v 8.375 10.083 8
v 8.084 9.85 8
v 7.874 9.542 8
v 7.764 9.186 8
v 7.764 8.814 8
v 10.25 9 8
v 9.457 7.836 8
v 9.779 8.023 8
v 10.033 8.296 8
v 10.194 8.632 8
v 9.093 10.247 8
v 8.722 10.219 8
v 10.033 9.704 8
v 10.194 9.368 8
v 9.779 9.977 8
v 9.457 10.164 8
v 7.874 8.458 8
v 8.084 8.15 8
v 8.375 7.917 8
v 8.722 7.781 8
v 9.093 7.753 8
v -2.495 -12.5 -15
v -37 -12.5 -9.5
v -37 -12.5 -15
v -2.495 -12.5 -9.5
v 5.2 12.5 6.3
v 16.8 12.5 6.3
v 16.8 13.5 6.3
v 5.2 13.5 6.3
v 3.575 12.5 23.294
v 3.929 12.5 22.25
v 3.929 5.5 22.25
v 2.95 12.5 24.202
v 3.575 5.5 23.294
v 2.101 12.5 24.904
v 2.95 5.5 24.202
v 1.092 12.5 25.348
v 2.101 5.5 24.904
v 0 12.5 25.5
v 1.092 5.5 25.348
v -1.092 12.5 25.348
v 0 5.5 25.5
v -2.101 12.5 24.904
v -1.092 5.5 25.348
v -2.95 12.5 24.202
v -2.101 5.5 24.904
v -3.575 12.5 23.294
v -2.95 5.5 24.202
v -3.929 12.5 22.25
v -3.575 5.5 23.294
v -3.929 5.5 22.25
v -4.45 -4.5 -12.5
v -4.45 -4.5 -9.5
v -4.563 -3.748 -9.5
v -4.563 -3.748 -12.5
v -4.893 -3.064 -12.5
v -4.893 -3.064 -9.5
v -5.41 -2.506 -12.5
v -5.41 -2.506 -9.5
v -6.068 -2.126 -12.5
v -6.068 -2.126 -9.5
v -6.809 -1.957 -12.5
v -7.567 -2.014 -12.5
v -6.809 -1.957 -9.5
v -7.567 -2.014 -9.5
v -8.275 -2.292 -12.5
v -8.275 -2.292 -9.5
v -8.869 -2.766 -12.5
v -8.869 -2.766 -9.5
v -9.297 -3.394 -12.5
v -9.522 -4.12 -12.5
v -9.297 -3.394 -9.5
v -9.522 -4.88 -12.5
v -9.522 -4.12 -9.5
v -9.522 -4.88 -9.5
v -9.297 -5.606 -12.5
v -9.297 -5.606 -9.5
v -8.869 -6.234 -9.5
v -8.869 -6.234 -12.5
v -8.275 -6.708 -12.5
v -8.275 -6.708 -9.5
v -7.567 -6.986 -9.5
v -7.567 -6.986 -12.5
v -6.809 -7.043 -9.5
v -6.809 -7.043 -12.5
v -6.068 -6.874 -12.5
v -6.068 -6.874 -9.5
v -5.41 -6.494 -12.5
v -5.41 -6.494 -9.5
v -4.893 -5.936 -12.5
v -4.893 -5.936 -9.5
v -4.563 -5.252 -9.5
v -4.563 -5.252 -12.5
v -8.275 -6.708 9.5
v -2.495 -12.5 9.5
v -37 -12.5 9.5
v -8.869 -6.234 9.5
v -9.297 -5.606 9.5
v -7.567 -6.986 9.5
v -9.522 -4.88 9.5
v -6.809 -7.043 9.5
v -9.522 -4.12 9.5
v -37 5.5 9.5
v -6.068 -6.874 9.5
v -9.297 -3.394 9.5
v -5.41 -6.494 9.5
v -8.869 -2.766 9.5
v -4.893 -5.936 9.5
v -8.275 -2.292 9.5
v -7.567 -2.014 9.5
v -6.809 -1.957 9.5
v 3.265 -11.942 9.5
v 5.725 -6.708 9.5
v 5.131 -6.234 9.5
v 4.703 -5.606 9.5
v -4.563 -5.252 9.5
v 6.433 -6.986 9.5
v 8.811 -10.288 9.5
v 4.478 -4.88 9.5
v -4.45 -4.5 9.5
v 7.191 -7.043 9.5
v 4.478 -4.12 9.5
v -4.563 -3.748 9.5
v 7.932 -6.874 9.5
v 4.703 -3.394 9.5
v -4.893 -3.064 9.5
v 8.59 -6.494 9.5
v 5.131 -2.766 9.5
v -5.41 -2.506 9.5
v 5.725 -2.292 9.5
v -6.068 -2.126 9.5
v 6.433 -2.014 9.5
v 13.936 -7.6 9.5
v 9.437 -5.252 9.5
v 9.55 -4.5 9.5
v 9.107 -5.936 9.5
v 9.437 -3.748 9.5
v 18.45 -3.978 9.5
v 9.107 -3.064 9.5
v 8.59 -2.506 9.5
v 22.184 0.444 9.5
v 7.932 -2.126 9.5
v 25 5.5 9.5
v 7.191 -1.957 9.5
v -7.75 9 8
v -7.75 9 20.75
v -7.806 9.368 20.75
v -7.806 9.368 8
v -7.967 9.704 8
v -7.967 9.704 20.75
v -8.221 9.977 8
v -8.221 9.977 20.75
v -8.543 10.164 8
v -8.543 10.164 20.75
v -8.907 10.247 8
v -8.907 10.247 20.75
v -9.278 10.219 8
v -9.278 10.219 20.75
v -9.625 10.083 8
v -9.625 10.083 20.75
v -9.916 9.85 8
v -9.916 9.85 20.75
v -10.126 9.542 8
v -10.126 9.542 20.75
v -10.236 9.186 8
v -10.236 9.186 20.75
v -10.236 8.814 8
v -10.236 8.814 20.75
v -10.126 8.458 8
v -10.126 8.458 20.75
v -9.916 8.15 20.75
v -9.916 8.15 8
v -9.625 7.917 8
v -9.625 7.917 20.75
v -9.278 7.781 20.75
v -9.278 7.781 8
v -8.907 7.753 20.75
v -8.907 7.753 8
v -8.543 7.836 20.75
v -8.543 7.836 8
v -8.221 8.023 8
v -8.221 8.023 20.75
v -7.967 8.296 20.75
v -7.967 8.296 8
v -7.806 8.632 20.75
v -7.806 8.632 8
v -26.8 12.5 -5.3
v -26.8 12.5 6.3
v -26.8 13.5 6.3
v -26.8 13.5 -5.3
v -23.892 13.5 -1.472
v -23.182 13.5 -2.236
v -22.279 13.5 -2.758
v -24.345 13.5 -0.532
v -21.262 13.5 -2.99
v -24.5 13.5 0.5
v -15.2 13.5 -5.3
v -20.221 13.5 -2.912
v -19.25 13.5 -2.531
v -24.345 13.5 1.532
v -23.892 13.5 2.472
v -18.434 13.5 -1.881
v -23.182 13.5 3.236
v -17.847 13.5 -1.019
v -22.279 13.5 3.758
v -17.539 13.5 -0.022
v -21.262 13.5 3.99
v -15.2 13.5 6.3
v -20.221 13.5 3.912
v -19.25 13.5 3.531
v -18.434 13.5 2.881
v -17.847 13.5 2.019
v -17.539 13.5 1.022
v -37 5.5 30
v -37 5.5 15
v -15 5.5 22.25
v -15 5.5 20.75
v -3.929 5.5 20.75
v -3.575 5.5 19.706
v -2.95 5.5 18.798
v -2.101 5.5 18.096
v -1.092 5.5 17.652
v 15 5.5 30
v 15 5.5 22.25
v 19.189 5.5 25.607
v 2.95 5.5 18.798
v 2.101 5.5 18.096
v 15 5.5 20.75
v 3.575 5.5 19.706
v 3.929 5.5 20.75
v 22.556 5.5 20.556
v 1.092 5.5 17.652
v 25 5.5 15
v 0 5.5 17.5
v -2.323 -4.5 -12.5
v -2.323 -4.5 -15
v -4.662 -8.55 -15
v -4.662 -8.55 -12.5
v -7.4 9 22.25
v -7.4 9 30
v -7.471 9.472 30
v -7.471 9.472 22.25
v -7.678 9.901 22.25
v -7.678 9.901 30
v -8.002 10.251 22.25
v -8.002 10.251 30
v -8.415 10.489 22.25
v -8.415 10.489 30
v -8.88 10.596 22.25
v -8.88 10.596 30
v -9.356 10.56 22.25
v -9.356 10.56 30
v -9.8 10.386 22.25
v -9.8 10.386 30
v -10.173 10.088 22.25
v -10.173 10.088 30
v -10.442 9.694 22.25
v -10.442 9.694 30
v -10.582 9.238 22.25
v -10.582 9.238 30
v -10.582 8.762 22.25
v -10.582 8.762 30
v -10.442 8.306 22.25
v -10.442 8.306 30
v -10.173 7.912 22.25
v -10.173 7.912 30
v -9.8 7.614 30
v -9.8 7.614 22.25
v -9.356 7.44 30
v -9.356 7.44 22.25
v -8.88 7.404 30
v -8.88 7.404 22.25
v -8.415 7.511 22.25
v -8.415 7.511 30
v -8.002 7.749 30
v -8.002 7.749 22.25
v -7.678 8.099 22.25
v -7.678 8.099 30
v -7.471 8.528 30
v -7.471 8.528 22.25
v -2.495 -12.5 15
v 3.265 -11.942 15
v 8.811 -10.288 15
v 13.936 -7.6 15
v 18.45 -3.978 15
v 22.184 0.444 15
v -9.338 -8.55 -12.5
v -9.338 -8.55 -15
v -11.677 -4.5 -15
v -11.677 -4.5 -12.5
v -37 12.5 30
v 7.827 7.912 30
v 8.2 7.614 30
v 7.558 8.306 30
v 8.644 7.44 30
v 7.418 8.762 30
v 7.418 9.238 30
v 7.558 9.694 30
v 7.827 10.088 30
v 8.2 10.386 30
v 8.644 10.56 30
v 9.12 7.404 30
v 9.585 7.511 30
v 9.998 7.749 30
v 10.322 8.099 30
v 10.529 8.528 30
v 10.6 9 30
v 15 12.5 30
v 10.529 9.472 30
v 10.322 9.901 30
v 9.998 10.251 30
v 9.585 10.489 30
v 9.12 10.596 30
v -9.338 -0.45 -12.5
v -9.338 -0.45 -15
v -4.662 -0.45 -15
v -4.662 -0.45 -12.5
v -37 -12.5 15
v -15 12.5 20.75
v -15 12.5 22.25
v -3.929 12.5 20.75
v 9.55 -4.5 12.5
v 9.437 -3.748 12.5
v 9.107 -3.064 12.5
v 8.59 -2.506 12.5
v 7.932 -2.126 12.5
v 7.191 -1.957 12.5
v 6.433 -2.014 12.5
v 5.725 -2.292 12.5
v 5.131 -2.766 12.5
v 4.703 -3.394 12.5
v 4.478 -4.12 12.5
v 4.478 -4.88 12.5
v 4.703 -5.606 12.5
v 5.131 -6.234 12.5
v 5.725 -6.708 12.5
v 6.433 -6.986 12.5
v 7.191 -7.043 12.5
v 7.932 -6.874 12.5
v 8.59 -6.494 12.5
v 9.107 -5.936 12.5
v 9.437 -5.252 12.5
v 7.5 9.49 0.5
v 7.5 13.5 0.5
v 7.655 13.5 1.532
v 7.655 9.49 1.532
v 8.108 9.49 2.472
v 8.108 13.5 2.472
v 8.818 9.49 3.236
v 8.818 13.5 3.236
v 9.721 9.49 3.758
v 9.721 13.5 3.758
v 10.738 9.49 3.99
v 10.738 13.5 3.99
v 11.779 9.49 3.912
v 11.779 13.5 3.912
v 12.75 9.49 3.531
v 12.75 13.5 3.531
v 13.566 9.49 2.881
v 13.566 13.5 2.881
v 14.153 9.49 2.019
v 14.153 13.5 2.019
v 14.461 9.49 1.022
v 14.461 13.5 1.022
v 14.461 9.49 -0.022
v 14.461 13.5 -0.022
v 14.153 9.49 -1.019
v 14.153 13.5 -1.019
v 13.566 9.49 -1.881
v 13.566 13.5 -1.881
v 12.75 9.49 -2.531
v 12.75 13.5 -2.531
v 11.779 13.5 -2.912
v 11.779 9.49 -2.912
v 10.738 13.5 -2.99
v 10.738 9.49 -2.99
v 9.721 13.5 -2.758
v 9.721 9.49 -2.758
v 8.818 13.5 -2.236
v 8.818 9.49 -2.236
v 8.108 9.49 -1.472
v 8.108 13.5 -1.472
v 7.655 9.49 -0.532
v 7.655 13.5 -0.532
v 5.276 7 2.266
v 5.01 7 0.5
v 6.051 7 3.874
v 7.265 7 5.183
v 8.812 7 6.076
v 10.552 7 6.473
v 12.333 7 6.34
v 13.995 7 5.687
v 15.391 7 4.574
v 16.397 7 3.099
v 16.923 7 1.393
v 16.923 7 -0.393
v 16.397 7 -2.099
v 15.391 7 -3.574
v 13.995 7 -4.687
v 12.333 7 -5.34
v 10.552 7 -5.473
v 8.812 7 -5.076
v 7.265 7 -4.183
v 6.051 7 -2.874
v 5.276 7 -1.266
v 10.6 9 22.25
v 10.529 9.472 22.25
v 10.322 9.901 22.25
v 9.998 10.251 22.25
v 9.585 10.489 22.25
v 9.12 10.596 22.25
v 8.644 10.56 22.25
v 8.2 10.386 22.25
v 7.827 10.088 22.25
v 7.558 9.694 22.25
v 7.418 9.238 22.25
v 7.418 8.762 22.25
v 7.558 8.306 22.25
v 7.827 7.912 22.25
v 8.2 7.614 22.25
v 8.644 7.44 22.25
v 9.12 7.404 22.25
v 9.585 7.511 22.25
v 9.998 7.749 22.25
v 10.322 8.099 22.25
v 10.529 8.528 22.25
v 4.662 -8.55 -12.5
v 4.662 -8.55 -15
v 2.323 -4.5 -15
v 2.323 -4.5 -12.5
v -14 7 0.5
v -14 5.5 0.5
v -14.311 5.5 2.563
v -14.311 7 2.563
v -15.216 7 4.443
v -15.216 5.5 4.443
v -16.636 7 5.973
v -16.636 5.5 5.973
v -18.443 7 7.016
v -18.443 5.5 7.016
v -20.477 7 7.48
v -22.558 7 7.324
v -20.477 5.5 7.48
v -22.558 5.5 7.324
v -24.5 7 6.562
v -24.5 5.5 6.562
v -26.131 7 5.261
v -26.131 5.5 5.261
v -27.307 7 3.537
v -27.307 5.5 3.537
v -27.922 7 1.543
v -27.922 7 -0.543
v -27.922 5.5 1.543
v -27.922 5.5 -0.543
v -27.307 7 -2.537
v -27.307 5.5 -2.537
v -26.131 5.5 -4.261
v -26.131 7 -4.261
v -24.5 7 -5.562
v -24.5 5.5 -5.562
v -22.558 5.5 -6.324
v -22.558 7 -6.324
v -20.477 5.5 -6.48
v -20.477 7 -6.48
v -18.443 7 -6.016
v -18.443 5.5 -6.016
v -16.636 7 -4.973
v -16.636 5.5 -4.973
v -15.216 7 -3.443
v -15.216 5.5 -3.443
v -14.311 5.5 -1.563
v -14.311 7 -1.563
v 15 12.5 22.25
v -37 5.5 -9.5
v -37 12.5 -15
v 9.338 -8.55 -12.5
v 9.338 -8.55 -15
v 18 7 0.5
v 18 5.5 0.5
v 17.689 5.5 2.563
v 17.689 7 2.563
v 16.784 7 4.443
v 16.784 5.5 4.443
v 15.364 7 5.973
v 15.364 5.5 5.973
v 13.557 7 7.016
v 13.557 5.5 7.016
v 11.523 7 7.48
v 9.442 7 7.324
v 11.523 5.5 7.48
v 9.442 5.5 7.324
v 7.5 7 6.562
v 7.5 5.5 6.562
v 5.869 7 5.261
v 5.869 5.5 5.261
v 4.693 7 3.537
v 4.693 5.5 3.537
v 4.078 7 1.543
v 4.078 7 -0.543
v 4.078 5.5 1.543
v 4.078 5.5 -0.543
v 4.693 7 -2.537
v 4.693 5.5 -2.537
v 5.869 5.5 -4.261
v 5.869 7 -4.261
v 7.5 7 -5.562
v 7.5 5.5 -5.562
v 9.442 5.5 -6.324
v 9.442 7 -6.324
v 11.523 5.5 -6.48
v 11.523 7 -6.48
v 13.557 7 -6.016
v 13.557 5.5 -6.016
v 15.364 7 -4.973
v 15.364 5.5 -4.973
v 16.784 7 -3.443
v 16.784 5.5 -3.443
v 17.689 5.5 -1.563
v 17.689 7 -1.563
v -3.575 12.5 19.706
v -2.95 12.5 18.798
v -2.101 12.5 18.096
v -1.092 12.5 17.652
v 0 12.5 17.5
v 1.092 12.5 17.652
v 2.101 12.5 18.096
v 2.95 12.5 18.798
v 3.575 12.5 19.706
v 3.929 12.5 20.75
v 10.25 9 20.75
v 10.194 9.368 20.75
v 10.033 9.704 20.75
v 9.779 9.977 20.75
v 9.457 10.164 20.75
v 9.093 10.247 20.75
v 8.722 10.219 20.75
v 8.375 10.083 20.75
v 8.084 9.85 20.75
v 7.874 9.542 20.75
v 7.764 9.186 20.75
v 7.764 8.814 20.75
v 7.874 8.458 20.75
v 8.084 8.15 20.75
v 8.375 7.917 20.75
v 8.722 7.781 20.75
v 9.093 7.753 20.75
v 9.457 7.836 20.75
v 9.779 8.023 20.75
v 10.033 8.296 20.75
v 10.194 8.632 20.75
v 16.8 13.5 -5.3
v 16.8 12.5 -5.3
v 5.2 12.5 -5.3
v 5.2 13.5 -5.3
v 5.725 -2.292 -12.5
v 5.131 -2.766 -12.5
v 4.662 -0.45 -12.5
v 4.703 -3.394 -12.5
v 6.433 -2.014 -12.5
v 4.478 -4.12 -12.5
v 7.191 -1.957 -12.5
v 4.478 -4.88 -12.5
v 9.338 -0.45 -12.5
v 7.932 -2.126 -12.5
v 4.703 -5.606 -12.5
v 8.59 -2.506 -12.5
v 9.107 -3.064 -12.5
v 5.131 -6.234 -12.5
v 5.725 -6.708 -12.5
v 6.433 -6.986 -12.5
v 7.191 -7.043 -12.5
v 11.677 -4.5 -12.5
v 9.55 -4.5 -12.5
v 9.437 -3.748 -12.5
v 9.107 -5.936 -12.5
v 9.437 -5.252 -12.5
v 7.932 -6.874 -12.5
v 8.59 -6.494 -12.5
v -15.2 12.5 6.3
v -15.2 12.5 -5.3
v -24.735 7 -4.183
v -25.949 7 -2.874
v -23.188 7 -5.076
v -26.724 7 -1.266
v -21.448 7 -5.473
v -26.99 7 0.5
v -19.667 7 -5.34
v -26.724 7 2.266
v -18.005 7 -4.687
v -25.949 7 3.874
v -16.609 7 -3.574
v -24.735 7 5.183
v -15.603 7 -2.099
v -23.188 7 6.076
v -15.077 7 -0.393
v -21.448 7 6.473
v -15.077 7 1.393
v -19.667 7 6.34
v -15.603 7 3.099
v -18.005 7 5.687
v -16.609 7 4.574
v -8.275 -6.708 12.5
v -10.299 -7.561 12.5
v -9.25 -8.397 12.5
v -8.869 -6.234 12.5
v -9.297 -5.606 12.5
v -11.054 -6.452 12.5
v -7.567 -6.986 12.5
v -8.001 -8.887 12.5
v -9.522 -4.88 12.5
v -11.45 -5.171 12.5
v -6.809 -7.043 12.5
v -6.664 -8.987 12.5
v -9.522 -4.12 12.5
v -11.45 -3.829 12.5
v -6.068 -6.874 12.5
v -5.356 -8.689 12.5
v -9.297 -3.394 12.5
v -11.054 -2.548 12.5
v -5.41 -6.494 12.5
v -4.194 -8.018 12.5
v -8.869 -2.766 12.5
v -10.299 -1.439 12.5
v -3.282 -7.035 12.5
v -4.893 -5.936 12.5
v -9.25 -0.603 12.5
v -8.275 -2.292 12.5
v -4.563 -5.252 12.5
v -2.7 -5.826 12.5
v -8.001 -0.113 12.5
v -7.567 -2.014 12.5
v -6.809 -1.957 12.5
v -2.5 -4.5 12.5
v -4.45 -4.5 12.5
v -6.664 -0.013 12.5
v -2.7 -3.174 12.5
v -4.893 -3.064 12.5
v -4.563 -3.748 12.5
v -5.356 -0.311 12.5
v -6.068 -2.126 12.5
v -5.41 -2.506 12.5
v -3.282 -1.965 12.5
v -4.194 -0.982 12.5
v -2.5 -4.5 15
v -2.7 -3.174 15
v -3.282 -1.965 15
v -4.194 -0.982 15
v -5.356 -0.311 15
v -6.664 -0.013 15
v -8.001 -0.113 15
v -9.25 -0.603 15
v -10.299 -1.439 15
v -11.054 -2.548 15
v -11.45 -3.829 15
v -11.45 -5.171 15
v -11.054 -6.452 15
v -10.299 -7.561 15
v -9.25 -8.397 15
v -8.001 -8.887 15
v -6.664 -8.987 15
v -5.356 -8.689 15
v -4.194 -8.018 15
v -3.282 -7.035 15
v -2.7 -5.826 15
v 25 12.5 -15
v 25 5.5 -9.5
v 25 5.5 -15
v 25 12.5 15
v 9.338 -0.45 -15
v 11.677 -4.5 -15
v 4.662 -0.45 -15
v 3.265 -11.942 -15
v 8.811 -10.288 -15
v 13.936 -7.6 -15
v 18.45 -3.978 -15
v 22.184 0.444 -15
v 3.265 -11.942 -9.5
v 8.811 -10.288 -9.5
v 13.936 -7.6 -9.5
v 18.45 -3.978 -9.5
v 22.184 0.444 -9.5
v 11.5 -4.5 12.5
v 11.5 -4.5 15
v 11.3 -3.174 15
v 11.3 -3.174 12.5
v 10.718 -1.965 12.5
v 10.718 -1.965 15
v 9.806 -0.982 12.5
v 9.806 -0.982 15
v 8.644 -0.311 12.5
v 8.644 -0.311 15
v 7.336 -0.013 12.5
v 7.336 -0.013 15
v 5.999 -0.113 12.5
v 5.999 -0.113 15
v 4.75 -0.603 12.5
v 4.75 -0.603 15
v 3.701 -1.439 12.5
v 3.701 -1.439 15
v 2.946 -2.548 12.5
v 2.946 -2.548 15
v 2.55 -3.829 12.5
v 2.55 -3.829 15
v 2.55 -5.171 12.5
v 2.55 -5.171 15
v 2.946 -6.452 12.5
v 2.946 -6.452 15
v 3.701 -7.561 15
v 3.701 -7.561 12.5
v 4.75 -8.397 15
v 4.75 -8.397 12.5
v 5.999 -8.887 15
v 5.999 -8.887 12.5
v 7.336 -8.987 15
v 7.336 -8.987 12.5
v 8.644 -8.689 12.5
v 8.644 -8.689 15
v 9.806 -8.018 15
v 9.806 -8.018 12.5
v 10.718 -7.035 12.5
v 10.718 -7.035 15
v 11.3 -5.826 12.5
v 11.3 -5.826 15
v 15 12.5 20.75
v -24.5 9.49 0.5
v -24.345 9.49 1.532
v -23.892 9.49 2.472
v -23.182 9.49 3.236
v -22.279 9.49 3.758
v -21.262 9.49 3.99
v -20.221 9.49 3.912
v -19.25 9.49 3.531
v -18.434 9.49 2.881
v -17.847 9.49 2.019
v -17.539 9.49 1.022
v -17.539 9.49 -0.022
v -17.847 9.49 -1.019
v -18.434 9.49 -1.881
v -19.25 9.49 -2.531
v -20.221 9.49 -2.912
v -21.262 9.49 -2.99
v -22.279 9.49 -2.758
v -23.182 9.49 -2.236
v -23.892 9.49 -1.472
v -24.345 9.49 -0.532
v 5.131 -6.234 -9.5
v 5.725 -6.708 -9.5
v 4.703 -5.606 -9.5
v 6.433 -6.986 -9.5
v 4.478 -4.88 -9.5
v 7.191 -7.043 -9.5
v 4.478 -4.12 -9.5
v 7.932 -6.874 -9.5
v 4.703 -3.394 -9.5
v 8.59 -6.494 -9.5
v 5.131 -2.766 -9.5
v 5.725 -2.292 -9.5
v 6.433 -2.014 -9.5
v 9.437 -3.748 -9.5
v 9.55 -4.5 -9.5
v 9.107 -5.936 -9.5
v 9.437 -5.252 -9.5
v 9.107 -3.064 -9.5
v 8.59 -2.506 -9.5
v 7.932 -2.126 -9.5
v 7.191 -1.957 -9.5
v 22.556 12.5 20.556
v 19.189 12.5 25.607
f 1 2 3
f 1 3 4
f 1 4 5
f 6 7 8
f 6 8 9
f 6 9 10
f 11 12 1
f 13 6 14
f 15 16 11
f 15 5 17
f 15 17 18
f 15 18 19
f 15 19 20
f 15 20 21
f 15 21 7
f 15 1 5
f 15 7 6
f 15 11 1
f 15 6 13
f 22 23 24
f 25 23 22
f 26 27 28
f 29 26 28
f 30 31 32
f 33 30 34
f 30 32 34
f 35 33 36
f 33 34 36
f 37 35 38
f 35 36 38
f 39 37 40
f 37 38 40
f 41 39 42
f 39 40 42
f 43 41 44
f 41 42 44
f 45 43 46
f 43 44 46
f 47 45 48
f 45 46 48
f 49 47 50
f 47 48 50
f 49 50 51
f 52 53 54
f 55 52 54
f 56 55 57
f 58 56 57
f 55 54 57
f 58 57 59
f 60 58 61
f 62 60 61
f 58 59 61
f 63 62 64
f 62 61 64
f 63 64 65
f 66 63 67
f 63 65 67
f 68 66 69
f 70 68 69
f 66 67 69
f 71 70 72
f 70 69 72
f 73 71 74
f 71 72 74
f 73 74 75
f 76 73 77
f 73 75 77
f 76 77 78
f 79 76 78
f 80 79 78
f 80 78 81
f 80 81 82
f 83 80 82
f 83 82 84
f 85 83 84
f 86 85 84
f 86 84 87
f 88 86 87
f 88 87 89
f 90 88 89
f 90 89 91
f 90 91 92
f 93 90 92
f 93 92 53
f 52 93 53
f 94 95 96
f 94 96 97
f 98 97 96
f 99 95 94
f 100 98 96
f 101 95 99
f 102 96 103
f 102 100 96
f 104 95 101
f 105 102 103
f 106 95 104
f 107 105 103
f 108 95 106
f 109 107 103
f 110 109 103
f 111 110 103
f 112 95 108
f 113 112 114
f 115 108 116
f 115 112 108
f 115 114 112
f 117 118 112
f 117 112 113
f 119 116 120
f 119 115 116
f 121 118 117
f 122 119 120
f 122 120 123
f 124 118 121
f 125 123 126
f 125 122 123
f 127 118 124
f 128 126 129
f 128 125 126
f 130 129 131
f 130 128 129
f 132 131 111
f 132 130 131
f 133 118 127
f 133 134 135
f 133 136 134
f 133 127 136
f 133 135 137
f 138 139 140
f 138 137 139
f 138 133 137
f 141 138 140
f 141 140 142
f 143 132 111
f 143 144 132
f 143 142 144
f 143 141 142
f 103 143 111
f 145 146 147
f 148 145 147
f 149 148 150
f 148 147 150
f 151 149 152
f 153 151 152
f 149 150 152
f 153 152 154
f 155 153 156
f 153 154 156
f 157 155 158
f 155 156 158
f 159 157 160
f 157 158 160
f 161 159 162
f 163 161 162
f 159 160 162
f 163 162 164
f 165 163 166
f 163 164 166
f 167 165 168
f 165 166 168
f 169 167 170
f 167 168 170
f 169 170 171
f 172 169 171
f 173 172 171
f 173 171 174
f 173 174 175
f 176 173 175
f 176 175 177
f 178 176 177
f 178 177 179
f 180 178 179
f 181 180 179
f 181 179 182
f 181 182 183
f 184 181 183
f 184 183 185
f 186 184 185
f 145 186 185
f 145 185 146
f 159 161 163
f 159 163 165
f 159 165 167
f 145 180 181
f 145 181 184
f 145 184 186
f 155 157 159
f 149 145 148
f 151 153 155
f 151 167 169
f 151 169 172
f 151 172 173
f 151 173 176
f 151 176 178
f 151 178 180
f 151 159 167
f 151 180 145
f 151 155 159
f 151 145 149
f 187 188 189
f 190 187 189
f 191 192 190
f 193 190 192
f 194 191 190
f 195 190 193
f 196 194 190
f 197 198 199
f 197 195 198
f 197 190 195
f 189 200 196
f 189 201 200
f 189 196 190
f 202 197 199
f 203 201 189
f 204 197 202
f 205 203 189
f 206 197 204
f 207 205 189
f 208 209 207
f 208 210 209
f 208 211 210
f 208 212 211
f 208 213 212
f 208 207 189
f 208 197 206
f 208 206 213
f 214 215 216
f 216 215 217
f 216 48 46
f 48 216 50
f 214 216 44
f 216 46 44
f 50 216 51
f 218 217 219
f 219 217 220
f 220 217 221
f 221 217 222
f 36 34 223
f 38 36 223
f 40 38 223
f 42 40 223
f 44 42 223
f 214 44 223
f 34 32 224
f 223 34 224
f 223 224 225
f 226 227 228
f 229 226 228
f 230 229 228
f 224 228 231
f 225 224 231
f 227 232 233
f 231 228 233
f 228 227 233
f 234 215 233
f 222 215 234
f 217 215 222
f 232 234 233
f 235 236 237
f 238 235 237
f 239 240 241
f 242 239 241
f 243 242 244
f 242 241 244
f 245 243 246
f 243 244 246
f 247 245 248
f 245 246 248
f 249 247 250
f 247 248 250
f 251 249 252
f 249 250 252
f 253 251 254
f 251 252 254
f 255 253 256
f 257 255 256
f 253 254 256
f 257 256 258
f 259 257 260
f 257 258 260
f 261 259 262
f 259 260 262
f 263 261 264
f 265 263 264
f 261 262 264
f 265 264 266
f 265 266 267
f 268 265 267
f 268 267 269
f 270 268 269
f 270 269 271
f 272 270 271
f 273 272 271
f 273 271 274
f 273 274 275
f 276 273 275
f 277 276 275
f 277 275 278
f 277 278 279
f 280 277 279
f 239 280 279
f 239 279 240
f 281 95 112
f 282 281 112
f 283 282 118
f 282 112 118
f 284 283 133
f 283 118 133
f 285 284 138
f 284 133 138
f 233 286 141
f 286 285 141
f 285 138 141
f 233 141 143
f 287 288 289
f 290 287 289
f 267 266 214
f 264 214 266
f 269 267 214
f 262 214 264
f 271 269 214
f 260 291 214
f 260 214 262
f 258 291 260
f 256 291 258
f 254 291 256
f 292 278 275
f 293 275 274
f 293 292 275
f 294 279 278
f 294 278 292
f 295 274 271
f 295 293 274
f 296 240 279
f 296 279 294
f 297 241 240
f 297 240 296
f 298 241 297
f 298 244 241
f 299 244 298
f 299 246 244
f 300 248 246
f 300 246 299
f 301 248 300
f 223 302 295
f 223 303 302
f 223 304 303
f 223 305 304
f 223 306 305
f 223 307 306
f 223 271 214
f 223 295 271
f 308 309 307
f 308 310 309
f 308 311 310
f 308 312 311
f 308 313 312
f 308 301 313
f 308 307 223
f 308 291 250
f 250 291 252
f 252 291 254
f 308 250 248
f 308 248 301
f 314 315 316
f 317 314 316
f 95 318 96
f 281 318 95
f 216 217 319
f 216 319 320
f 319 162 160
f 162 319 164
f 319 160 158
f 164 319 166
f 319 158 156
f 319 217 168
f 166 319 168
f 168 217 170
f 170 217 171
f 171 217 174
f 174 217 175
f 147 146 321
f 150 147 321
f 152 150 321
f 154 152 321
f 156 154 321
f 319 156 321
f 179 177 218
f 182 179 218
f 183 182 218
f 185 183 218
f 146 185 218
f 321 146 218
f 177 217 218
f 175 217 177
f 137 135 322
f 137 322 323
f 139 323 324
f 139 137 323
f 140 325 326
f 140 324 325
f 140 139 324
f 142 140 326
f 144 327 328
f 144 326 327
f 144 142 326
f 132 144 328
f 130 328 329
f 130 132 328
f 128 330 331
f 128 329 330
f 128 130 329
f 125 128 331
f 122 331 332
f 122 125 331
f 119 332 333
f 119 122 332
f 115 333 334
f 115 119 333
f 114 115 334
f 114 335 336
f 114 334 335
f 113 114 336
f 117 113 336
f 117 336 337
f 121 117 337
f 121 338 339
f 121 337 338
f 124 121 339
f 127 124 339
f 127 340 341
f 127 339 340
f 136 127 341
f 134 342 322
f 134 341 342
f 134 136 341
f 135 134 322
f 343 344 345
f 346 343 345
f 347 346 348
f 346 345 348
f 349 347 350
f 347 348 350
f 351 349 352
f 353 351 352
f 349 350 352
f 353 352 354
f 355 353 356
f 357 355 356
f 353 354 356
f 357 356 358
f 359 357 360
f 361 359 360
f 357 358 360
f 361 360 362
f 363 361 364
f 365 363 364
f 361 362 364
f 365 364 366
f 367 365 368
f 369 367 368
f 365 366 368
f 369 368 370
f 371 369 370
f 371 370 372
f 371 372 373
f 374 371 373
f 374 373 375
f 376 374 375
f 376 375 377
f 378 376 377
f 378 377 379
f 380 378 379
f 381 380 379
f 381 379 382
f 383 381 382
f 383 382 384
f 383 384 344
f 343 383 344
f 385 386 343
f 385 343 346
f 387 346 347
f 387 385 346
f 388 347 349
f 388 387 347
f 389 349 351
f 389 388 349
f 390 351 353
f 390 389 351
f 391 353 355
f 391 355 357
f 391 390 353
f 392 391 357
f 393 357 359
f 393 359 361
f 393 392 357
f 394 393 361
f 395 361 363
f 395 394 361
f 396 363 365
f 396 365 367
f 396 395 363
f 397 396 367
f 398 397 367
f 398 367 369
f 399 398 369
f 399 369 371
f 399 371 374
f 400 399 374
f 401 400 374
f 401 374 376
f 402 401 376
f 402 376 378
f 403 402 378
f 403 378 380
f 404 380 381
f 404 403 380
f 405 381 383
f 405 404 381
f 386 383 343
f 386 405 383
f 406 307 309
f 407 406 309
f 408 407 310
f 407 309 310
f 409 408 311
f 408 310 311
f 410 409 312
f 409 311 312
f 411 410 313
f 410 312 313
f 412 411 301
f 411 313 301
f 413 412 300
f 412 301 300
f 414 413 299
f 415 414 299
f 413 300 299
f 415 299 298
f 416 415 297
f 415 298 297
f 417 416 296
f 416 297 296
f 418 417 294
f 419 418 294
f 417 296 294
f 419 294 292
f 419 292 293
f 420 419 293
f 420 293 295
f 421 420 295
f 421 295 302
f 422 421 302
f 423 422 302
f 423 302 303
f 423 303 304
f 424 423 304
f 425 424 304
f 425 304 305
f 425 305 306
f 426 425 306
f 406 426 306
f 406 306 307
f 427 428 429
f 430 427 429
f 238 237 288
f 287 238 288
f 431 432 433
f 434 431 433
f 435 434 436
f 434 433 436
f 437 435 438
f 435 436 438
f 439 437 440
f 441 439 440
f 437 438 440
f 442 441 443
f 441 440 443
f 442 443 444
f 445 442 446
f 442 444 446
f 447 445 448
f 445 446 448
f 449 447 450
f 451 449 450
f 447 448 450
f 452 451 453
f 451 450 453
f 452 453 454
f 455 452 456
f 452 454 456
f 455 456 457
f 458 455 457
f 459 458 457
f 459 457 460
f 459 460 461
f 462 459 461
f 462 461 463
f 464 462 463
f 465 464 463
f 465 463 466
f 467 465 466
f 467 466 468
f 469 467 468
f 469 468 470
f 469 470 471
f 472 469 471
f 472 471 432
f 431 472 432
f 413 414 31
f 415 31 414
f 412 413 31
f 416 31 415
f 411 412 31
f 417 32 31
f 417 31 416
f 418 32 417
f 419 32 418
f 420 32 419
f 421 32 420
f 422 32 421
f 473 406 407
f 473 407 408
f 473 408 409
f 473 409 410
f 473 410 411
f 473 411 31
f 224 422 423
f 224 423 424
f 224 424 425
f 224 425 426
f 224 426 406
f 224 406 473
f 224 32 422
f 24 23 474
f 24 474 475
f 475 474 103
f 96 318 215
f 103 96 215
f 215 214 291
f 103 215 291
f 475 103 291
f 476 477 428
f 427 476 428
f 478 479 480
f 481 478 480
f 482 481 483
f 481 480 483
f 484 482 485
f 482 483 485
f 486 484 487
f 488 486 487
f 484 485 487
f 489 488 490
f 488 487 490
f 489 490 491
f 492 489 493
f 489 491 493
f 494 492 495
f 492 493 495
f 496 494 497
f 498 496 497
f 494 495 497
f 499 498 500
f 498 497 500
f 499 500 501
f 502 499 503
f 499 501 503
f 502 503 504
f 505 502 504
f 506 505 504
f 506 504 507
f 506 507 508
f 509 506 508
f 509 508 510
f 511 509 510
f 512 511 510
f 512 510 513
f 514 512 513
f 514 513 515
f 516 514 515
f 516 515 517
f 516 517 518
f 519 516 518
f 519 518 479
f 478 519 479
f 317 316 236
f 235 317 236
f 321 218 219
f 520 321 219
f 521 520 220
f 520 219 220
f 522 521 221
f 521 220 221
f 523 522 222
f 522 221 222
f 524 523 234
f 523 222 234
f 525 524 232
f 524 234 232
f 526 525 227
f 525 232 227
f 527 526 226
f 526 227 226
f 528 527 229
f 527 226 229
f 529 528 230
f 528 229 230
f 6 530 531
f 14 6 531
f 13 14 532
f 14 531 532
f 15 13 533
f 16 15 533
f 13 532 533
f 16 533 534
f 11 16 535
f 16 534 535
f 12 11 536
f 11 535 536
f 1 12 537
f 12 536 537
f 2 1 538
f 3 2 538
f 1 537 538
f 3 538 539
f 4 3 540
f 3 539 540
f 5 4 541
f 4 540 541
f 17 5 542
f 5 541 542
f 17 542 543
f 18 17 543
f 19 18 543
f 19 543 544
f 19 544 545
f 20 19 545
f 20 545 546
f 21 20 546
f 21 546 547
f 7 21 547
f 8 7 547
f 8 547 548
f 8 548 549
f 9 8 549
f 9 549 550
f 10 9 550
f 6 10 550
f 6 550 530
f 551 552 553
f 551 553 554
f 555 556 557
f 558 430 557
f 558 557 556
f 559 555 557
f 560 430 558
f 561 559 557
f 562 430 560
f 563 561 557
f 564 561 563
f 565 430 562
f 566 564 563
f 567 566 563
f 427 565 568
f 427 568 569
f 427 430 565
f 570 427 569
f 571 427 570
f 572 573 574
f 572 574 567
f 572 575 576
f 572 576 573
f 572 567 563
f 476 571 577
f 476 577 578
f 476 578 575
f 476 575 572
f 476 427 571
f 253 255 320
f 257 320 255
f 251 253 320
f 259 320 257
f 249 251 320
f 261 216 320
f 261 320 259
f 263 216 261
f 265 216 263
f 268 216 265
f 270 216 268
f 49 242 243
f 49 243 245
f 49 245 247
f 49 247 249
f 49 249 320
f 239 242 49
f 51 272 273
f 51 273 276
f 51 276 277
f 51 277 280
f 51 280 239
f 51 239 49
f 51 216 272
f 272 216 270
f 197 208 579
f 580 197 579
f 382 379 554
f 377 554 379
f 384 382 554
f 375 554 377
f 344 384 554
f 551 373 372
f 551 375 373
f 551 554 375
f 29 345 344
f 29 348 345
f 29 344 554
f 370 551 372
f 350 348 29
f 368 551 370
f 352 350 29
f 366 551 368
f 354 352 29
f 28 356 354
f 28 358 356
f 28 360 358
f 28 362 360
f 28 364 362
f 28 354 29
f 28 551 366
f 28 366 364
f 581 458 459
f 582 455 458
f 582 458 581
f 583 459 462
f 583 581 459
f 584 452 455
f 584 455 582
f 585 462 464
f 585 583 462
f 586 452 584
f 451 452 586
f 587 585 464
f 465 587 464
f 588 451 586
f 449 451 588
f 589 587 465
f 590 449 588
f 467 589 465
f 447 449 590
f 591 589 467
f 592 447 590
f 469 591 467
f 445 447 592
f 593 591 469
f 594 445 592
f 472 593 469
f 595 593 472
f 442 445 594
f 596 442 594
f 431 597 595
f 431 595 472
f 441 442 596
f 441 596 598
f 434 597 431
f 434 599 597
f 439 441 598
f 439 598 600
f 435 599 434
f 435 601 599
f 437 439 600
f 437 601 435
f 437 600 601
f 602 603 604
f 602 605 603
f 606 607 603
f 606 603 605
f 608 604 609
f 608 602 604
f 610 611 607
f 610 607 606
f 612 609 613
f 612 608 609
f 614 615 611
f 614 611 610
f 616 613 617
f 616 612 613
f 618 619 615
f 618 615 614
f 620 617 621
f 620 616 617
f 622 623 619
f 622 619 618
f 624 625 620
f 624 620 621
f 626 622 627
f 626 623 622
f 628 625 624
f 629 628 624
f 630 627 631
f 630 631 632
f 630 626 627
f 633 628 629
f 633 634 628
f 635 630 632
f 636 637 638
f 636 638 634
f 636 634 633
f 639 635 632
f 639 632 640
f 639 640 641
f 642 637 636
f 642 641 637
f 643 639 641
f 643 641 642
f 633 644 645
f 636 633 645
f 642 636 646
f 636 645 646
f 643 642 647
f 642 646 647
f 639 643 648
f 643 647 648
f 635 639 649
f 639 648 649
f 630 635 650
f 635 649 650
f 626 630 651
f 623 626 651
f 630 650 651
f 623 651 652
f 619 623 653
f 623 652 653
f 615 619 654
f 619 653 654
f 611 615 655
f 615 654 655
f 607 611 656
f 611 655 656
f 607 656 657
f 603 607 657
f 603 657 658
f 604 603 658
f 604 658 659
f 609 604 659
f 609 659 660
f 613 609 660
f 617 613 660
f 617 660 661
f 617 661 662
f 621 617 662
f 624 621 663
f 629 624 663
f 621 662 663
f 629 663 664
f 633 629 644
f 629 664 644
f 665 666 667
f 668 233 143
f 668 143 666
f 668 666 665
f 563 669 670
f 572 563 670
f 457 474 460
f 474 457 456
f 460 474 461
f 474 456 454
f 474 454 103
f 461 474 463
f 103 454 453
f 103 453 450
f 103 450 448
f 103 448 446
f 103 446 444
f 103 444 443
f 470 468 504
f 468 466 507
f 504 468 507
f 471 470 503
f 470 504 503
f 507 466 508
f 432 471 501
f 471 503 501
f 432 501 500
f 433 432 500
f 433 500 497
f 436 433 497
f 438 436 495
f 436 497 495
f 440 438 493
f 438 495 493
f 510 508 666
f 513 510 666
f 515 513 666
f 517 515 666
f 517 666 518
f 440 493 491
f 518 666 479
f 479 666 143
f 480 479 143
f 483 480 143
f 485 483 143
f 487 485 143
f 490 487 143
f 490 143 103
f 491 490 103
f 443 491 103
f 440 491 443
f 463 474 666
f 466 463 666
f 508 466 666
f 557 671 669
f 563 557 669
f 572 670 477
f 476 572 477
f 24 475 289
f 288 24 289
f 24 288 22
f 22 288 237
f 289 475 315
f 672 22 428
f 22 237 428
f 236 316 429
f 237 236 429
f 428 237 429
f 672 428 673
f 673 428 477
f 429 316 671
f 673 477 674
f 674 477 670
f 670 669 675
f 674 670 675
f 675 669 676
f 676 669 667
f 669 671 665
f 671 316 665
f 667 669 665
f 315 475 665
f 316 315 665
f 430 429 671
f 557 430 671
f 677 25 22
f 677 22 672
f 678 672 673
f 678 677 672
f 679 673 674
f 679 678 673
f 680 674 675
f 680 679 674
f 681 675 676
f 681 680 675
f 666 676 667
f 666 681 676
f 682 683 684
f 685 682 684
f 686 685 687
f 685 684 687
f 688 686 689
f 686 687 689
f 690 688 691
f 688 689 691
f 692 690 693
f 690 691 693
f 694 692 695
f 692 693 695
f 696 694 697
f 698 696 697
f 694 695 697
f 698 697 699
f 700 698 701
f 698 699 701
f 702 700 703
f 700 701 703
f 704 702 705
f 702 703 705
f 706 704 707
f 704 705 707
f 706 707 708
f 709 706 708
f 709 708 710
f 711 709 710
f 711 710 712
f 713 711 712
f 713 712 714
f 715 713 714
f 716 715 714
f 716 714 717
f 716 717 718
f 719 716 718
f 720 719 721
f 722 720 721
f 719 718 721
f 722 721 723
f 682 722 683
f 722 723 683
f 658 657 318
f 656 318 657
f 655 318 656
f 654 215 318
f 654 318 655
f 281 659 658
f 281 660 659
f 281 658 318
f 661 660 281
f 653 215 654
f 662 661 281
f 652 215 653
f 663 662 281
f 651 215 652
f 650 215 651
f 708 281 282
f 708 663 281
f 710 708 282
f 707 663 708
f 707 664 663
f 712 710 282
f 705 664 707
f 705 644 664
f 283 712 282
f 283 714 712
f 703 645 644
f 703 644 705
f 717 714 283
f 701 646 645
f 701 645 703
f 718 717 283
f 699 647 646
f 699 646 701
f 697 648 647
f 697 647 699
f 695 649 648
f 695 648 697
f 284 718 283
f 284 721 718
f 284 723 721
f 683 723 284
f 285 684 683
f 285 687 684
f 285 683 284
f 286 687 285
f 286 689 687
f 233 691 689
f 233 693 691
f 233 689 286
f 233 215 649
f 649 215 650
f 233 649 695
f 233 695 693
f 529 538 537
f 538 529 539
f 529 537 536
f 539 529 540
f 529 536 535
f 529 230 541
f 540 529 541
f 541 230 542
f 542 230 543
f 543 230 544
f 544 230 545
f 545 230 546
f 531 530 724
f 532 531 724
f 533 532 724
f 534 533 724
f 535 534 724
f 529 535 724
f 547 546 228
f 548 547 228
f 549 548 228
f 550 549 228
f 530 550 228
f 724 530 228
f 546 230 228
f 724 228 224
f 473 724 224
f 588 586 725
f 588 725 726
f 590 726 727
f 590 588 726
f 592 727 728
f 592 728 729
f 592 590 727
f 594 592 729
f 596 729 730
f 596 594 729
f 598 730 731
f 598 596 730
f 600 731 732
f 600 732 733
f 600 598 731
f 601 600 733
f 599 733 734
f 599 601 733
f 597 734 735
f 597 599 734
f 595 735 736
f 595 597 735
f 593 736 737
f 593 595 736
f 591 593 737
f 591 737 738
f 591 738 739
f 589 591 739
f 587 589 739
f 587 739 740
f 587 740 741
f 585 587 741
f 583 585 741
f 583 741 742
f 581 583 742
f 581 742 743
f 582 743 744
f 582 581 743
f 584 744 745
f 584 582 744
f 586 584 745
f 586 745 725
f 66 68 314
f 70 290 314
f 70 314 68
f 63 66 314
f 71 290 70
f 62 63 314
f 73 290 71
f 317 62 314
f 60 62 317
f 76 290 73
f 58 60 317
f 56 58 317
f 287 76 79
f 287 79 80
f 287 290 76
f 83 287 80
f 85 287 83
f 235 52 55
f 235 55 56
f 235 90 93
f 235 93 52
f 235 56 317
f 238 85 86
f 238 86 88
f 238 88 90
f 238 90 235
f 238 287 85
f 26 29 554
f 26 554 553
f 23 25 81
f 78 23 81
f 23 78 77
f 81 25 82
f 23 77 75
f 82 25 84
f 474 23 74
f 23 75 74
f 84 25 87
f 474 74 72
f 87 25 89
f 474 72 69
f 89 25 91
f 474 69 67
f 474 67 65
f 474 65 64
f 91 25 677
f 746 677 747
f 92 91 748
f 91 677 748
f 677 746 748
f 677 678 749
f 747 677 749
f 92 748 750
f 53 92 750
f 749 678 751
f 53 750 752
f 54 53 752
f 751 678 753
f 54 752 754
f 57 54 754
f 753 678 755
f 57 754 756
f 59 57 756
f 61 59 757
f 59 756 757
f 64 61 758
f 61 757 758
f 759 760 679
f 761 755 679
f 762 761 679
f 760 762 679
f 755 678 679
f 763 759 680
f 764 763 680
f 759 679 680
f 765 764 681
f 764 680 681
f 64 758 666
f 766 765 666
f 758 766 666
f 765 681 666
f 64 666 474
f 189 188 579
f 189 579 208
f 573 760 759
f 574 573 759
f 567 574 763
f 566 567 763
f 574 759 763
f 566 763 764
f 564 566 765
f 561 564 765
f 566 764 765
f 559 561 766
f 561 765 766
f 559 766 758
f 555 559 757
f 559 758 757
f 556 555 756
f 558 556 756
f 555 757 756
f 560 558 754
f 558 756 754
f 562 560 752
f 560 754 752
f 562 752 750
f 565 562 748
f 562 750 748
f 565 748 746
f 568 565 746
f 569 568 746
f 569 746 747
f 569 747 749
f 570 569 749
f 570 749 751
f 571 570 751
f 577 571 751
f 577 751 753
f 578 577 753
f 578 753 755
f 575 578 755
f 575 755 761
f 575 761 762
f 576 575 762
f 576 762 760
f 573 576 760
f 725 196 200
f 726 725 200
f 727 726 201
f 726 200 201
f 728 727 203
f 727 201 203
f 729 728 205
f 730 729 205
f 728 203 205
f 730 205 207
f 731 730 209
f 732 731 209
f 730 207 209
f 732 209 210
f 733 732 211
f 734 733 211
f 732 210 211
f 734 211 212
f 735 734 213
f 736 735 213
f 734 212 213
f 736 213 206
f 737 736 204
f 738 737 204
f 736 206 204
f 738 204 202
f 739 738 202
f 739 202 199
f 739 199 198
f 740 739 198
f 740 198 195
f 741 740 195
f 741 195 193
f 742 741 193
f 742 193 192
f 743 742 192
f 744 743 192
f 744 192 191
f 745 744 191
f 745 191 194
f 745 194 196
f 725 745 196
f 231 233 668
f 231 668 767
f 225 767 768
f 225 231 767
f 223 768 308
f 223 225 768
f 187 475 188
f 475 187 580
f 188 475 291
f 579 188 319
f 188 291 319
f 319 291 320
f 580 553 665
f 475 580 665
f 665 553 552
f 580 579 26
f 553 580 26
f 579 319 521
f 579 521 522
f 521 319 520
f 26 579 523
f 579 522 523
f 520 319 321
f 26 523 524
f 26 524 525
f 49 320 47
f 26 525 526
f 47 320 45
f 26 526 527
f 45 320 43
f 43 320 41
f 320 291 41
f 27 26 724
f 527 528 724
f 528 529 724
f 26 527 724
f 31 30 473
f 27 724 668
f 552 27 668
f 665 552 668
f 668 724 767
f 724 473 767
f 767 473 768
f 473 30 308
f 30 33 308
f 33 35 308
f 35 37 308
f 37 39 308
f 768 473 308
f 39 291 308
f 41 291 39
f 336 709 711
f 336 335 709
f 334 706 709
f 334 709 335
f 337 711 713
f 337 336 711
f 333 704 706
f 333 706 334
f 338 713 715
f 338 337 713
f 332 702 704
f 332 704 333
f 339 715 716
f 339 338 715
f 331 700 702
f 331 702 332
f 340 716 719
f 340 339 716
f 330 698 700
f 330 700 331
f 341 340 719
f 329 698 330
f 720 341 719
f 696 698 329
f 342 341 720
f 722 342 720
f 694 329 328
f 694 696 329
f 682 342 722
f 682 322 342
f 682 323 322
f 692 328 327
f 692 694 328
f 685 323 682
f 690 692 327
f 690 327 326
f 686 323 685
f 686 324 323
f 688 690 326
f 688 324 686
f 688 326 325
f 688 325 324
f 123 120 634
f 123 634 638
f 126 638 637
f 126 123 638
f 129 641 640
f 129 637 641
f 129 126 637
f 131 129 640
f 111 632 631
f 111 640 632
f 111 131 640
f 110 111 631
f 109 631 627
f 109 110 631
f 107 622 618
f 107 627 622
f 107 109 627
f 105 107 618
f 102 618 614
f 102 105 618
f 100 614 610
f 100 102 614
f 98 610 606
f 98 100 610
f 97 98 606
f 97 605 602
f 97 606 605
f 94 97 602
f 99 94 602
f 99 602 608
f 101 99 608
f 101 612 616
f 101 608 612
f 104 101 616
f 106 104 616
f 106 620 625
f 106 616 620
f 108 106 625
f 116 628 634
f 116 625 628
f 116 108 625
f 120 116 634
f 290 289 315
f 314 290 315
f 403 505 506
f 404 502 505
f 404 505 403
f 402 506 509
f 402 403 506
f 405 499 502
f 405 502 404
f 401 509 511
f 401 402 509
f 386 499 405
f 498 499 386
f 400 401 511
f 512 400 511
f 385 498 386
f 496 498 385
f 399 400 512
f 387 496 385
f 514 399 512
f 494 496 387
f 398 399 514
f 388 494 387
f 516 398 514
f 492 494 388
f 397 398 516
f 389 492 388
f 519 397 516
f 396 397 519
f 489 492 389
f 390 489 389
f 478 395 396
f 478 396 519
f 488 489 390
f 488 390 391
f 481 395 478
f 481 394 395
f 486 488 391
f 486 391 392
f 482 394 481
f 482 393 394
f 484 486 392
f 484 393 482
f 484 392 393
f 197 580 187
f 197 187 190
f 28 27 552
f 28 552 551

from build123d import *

# Parameters (mm, degrees)
SKETCH_W             = 62
SKETCH_H             = 25
PAD_DEPTH            = 15
SKETCH001_W          = 18
SKETCH001_H          = 19
POCKET_DEPTH         = 37.001
POCKET_DEPTH_BACK    = -25.001
SKETCH002_R          = 2.55
POCKET001_DEPTH      = 15.001
POCKET001_DEPTH_BACK = -15.001
SKETCH003_W          = 62
SKETCH003_H          = 7
PAD001_DEPTH         = 30
SKETCH004_R          = 4
POCKET002_DEPTH      = 12.501
SKETCH005_W          = 1
SKETCH005_H          = 11.6
PAD002_DEPTH         = 16.8
PAD002_DEPTH_BACK    = 26.8
SKETCH012_W          = 20.4
SKETCH012_H          = 1
POCKET003_DEPTH      = 11.6
SKETCH013_R          = 3.5
POCKET004_DEPTH      = 26.001
POCKET005_DEPTH      = 15.001
POCKET005_DEPTH_BACK = -30.001
POCKET006_DEPTH      = 13.501
SKETCH016_R          = 7
POCKET007_DEPTH      = 7
CHAMFER_SIZE         = 2.49
POCKET008_DEPTH      = 2.5
SKETCH019_R          = 4.5
POCKET009_DEPTH      = 2.5
SKETCH020_W          = 30
SKETCH020_H          = 1.5
POCKET010_DEPTH      = 8.001
SKETCH021_R          = 1.25
POCKET011_DEPTH      = 22
SKETCH022_R          = 1.6
POCKET012_DEPTH      = 8


with BuildPart() as part:
    # Sketch → Pad (new body, symmetric)
    with BuildSketch(Plane.XY):
        with Locations((-6, 0)):
            Rectangle(SKETCH_W, SKETCH_H)
    extrude(amount=PAD_DEPTH, both=True)

    # Sketch001 → Pocket (cut, two sides)
    with BuildSketch(Plane.YZ) as pocket_sk:
        with Locations((-3.5, 0)):
            Rectangle(SKETCH001_W, SKETCH001_H)
    extrude(amount=-POCKET_DEPTH, mode=Mode.SUBTRACT)
    extrude(pocket_sk.sketch, amount=-POCKET_DEPTH_BACK, mode=Mode.SUBTRACT)

    # Sketch002 → Pocket001 (cut, two sides)
    with BuildSketch(Plane.XY) as pocket001_sk:
        with Locations((-7, -4.5)):
            Circle(SKETCH002_R)
        with Locations((7, -4.5)):
            Circle(SKETCH002_R)
    extrude(amount=-POCKET001_DEPTH, mode=Mode.SUBTRACT)
    extrude(pocket001_sk.sketch, amount=-POCKET001_DEPTH_BACK, mode=Mode.SUBTRACT)

    # Sketch003 → Pad001 (join)
    with BuildSketch(Plane.XY):
        with Locations((-6, 9)):
            Rectangle(SKETCH003_W, SKETCH003_H)
    extrude(amount=PAD001_DEPTH)

    # Sketch004 → Pocket002 (cut, through all)
    with BuildSketch(Plane.XZ):
        with Locations((0, 21.5)):
            Circle(SKETCH004_R)
    extrude(amount=-POCKET002_DEPTH, mode=Mode.SUBTRACT)

    # Sketch005 → Pad002 (join, two sides)
    with BuildSketch(Plane.YZ) as pad002_sk:
        with Locations((13, 0.5)):
            Rectangle(SKETCH005_W, SKETCH005_H)
    extrude(amount=PAD002_DEPTH)
    extrude(pad002_sk.sketch, amount=-PAD002_DEPTH_BACK)

    # Sketch012 (on Face10 of Pad002) → Pocket003 (cut)
    with BuildSketch(Plane(origin=(0, 0, -5.3), x_dir=(1, 0, 0), z_dir=(0, 0, -1))):
        with Locations((-5, -13)):
            Rectangle(SKETCH012_W, SKETCH012_H)
    extrude(amount=-POCKET003_DEPTH, mode=Mode.SUBTRACT)

    # Sketch013 (on Face22 of Pocket003) → Pocket004 (cut, through all)
    with BuildSketch(Plane(origin=(0, 13.5, 0), x_dir=(-1, 0, 0), z_dir=(0, 1, 0))):
        with Locations((-11, 0.5)):
            Circle(SKETCH013_R)
        with Locations((21, 0.5)):
            Circle(SKETCH013_R)
    extrude(amount=-POCKET004_DEPTH, mode=Mode.SUBTRACT)

    # Sketch014 → Pocket005 (cut, two sides)
    with BuildSketch(Plane.XY) as pocket005_sk:
        with BuildLine():
            ThreePointArc((-2.495494, -12.5), (13.936206, -7.599812), (25, 5.5))
            Line((25, 5.5), (25, -12.5))
            Line((25, -12.5), (-2.495494, -12.5))
        make_face()
    extrude(amount=-POCKET005_DEPTH, mode=Mode.SUBTRACT)
    extrude(pocket005_sk.sketch, amount=-POCKET005_DEPTH_BACK, mode=Mode.SUBTRACT)

    # Sketch015 → Pocket006 (cut, through all)
    with BuildSketch(Plane.XZ):
        with BuildLine():
            ThreePointArc((25, 15), (20.982341, 23.154894), (15, 30))
            Line((25, 30), (15, 30))
            Line((25, 15), (25, 30))
        make_face()
    extrude(amount=-POCKET006_DEPTH, mode=Mode.SUBTRACT)

    # Sketch016 → Pocket007 (cut)
    with BuildSketch(Plane.XZ):
        with Locations((-21, 0.5)):
            Circle(SKETCH016_R)
        with Locations((11, 0.5)):
            Circle(SKETCH016_R)
    extrude(amount=-POCKET007_DEPTH, mode=Mode.SUBTRACT)

    # Chamfer
    chamfer_edges = [part.edges().sort_by_distance(p)[0] for p in [
        (-17.5, 7, 0.5),
        (14.5, 7, 0.5),
    ]]
    chamfer(chamfer_edges, length=CHAMFER_SIZE)

    # Sketch018 → Pocket008 (cut)
    with BuildSketch(Plane(origin=(0, 0, -15), x_dir=(1, 0, 0), z_dir=(0, 0, -1))):
        Polygon((-9.338269, 0.45), (-4.661731, 0.45), (-2.323463, 4.5), (-4.661731, 8.55), (-9.338269, 8.55), (-11.676537, 4.5), align=None)
        Polygon((9.338269, 0.45), (11.676537, 4.5), (9.338269, 8.55), (4.661731, 8.55), (2.323463, 4.5), (4.661731, 0.45), align=None)
    extrude(amount=-POCKET008_DEPTH, mode=Mode.SUBTRACT)

    # Sketch019 → Pocket009 (cut)
    with BuildSketch(Plane.XY.offset(15)):
        with Locations((-7, -4.5)):
            Circle(SKETCH019_R)
        with Locations((7, -4.5)):
            Circle(SKETCH019_R)
    extrude(amount=-POCKET009_DEPTH, mode=Mode.SUBTRACT)

    # Sketch020 (on Face40 of Pocket009) → Pocket010 (cut, through all)
    with BuildSketch(Plane.XZ.offset(-5.5)):
        with Locations((0, 21.5)):
            Rectangle(SKETCH020_W, SKETCH020_H)
    extrude(amount=-POCKET010_DEPTH, mode=Mode.SUBTRACT)

    # Sketch021 (on Face39 of Pocket010) → Pocket011 (cut)
    with BuildSketch(Plane.XY.offset(30)):
        with Locations((9, 9)):
            Circle(SKETCH021_R)
        with Locations((-9, 9)):
            Circle(SKETCH021_R)
    extrude(amount=-POCKET011_DEPTH, mode=Mode.SUBTRACT)

    # Sketch022 (on Face39 of Pocket011) → Pocket012 (cut)
    with BuildSketch(Plane.XY.offset(30)):
        with Locations((-9, 9)):
            Circle(SKETCH022_R)
        with Locations((9, 9)):
            Circle(SKETCH022_R)
    extrude(amount=-POCKET012_DEPTH, mode=Mode.SUBTRACT)


solid = part.part
